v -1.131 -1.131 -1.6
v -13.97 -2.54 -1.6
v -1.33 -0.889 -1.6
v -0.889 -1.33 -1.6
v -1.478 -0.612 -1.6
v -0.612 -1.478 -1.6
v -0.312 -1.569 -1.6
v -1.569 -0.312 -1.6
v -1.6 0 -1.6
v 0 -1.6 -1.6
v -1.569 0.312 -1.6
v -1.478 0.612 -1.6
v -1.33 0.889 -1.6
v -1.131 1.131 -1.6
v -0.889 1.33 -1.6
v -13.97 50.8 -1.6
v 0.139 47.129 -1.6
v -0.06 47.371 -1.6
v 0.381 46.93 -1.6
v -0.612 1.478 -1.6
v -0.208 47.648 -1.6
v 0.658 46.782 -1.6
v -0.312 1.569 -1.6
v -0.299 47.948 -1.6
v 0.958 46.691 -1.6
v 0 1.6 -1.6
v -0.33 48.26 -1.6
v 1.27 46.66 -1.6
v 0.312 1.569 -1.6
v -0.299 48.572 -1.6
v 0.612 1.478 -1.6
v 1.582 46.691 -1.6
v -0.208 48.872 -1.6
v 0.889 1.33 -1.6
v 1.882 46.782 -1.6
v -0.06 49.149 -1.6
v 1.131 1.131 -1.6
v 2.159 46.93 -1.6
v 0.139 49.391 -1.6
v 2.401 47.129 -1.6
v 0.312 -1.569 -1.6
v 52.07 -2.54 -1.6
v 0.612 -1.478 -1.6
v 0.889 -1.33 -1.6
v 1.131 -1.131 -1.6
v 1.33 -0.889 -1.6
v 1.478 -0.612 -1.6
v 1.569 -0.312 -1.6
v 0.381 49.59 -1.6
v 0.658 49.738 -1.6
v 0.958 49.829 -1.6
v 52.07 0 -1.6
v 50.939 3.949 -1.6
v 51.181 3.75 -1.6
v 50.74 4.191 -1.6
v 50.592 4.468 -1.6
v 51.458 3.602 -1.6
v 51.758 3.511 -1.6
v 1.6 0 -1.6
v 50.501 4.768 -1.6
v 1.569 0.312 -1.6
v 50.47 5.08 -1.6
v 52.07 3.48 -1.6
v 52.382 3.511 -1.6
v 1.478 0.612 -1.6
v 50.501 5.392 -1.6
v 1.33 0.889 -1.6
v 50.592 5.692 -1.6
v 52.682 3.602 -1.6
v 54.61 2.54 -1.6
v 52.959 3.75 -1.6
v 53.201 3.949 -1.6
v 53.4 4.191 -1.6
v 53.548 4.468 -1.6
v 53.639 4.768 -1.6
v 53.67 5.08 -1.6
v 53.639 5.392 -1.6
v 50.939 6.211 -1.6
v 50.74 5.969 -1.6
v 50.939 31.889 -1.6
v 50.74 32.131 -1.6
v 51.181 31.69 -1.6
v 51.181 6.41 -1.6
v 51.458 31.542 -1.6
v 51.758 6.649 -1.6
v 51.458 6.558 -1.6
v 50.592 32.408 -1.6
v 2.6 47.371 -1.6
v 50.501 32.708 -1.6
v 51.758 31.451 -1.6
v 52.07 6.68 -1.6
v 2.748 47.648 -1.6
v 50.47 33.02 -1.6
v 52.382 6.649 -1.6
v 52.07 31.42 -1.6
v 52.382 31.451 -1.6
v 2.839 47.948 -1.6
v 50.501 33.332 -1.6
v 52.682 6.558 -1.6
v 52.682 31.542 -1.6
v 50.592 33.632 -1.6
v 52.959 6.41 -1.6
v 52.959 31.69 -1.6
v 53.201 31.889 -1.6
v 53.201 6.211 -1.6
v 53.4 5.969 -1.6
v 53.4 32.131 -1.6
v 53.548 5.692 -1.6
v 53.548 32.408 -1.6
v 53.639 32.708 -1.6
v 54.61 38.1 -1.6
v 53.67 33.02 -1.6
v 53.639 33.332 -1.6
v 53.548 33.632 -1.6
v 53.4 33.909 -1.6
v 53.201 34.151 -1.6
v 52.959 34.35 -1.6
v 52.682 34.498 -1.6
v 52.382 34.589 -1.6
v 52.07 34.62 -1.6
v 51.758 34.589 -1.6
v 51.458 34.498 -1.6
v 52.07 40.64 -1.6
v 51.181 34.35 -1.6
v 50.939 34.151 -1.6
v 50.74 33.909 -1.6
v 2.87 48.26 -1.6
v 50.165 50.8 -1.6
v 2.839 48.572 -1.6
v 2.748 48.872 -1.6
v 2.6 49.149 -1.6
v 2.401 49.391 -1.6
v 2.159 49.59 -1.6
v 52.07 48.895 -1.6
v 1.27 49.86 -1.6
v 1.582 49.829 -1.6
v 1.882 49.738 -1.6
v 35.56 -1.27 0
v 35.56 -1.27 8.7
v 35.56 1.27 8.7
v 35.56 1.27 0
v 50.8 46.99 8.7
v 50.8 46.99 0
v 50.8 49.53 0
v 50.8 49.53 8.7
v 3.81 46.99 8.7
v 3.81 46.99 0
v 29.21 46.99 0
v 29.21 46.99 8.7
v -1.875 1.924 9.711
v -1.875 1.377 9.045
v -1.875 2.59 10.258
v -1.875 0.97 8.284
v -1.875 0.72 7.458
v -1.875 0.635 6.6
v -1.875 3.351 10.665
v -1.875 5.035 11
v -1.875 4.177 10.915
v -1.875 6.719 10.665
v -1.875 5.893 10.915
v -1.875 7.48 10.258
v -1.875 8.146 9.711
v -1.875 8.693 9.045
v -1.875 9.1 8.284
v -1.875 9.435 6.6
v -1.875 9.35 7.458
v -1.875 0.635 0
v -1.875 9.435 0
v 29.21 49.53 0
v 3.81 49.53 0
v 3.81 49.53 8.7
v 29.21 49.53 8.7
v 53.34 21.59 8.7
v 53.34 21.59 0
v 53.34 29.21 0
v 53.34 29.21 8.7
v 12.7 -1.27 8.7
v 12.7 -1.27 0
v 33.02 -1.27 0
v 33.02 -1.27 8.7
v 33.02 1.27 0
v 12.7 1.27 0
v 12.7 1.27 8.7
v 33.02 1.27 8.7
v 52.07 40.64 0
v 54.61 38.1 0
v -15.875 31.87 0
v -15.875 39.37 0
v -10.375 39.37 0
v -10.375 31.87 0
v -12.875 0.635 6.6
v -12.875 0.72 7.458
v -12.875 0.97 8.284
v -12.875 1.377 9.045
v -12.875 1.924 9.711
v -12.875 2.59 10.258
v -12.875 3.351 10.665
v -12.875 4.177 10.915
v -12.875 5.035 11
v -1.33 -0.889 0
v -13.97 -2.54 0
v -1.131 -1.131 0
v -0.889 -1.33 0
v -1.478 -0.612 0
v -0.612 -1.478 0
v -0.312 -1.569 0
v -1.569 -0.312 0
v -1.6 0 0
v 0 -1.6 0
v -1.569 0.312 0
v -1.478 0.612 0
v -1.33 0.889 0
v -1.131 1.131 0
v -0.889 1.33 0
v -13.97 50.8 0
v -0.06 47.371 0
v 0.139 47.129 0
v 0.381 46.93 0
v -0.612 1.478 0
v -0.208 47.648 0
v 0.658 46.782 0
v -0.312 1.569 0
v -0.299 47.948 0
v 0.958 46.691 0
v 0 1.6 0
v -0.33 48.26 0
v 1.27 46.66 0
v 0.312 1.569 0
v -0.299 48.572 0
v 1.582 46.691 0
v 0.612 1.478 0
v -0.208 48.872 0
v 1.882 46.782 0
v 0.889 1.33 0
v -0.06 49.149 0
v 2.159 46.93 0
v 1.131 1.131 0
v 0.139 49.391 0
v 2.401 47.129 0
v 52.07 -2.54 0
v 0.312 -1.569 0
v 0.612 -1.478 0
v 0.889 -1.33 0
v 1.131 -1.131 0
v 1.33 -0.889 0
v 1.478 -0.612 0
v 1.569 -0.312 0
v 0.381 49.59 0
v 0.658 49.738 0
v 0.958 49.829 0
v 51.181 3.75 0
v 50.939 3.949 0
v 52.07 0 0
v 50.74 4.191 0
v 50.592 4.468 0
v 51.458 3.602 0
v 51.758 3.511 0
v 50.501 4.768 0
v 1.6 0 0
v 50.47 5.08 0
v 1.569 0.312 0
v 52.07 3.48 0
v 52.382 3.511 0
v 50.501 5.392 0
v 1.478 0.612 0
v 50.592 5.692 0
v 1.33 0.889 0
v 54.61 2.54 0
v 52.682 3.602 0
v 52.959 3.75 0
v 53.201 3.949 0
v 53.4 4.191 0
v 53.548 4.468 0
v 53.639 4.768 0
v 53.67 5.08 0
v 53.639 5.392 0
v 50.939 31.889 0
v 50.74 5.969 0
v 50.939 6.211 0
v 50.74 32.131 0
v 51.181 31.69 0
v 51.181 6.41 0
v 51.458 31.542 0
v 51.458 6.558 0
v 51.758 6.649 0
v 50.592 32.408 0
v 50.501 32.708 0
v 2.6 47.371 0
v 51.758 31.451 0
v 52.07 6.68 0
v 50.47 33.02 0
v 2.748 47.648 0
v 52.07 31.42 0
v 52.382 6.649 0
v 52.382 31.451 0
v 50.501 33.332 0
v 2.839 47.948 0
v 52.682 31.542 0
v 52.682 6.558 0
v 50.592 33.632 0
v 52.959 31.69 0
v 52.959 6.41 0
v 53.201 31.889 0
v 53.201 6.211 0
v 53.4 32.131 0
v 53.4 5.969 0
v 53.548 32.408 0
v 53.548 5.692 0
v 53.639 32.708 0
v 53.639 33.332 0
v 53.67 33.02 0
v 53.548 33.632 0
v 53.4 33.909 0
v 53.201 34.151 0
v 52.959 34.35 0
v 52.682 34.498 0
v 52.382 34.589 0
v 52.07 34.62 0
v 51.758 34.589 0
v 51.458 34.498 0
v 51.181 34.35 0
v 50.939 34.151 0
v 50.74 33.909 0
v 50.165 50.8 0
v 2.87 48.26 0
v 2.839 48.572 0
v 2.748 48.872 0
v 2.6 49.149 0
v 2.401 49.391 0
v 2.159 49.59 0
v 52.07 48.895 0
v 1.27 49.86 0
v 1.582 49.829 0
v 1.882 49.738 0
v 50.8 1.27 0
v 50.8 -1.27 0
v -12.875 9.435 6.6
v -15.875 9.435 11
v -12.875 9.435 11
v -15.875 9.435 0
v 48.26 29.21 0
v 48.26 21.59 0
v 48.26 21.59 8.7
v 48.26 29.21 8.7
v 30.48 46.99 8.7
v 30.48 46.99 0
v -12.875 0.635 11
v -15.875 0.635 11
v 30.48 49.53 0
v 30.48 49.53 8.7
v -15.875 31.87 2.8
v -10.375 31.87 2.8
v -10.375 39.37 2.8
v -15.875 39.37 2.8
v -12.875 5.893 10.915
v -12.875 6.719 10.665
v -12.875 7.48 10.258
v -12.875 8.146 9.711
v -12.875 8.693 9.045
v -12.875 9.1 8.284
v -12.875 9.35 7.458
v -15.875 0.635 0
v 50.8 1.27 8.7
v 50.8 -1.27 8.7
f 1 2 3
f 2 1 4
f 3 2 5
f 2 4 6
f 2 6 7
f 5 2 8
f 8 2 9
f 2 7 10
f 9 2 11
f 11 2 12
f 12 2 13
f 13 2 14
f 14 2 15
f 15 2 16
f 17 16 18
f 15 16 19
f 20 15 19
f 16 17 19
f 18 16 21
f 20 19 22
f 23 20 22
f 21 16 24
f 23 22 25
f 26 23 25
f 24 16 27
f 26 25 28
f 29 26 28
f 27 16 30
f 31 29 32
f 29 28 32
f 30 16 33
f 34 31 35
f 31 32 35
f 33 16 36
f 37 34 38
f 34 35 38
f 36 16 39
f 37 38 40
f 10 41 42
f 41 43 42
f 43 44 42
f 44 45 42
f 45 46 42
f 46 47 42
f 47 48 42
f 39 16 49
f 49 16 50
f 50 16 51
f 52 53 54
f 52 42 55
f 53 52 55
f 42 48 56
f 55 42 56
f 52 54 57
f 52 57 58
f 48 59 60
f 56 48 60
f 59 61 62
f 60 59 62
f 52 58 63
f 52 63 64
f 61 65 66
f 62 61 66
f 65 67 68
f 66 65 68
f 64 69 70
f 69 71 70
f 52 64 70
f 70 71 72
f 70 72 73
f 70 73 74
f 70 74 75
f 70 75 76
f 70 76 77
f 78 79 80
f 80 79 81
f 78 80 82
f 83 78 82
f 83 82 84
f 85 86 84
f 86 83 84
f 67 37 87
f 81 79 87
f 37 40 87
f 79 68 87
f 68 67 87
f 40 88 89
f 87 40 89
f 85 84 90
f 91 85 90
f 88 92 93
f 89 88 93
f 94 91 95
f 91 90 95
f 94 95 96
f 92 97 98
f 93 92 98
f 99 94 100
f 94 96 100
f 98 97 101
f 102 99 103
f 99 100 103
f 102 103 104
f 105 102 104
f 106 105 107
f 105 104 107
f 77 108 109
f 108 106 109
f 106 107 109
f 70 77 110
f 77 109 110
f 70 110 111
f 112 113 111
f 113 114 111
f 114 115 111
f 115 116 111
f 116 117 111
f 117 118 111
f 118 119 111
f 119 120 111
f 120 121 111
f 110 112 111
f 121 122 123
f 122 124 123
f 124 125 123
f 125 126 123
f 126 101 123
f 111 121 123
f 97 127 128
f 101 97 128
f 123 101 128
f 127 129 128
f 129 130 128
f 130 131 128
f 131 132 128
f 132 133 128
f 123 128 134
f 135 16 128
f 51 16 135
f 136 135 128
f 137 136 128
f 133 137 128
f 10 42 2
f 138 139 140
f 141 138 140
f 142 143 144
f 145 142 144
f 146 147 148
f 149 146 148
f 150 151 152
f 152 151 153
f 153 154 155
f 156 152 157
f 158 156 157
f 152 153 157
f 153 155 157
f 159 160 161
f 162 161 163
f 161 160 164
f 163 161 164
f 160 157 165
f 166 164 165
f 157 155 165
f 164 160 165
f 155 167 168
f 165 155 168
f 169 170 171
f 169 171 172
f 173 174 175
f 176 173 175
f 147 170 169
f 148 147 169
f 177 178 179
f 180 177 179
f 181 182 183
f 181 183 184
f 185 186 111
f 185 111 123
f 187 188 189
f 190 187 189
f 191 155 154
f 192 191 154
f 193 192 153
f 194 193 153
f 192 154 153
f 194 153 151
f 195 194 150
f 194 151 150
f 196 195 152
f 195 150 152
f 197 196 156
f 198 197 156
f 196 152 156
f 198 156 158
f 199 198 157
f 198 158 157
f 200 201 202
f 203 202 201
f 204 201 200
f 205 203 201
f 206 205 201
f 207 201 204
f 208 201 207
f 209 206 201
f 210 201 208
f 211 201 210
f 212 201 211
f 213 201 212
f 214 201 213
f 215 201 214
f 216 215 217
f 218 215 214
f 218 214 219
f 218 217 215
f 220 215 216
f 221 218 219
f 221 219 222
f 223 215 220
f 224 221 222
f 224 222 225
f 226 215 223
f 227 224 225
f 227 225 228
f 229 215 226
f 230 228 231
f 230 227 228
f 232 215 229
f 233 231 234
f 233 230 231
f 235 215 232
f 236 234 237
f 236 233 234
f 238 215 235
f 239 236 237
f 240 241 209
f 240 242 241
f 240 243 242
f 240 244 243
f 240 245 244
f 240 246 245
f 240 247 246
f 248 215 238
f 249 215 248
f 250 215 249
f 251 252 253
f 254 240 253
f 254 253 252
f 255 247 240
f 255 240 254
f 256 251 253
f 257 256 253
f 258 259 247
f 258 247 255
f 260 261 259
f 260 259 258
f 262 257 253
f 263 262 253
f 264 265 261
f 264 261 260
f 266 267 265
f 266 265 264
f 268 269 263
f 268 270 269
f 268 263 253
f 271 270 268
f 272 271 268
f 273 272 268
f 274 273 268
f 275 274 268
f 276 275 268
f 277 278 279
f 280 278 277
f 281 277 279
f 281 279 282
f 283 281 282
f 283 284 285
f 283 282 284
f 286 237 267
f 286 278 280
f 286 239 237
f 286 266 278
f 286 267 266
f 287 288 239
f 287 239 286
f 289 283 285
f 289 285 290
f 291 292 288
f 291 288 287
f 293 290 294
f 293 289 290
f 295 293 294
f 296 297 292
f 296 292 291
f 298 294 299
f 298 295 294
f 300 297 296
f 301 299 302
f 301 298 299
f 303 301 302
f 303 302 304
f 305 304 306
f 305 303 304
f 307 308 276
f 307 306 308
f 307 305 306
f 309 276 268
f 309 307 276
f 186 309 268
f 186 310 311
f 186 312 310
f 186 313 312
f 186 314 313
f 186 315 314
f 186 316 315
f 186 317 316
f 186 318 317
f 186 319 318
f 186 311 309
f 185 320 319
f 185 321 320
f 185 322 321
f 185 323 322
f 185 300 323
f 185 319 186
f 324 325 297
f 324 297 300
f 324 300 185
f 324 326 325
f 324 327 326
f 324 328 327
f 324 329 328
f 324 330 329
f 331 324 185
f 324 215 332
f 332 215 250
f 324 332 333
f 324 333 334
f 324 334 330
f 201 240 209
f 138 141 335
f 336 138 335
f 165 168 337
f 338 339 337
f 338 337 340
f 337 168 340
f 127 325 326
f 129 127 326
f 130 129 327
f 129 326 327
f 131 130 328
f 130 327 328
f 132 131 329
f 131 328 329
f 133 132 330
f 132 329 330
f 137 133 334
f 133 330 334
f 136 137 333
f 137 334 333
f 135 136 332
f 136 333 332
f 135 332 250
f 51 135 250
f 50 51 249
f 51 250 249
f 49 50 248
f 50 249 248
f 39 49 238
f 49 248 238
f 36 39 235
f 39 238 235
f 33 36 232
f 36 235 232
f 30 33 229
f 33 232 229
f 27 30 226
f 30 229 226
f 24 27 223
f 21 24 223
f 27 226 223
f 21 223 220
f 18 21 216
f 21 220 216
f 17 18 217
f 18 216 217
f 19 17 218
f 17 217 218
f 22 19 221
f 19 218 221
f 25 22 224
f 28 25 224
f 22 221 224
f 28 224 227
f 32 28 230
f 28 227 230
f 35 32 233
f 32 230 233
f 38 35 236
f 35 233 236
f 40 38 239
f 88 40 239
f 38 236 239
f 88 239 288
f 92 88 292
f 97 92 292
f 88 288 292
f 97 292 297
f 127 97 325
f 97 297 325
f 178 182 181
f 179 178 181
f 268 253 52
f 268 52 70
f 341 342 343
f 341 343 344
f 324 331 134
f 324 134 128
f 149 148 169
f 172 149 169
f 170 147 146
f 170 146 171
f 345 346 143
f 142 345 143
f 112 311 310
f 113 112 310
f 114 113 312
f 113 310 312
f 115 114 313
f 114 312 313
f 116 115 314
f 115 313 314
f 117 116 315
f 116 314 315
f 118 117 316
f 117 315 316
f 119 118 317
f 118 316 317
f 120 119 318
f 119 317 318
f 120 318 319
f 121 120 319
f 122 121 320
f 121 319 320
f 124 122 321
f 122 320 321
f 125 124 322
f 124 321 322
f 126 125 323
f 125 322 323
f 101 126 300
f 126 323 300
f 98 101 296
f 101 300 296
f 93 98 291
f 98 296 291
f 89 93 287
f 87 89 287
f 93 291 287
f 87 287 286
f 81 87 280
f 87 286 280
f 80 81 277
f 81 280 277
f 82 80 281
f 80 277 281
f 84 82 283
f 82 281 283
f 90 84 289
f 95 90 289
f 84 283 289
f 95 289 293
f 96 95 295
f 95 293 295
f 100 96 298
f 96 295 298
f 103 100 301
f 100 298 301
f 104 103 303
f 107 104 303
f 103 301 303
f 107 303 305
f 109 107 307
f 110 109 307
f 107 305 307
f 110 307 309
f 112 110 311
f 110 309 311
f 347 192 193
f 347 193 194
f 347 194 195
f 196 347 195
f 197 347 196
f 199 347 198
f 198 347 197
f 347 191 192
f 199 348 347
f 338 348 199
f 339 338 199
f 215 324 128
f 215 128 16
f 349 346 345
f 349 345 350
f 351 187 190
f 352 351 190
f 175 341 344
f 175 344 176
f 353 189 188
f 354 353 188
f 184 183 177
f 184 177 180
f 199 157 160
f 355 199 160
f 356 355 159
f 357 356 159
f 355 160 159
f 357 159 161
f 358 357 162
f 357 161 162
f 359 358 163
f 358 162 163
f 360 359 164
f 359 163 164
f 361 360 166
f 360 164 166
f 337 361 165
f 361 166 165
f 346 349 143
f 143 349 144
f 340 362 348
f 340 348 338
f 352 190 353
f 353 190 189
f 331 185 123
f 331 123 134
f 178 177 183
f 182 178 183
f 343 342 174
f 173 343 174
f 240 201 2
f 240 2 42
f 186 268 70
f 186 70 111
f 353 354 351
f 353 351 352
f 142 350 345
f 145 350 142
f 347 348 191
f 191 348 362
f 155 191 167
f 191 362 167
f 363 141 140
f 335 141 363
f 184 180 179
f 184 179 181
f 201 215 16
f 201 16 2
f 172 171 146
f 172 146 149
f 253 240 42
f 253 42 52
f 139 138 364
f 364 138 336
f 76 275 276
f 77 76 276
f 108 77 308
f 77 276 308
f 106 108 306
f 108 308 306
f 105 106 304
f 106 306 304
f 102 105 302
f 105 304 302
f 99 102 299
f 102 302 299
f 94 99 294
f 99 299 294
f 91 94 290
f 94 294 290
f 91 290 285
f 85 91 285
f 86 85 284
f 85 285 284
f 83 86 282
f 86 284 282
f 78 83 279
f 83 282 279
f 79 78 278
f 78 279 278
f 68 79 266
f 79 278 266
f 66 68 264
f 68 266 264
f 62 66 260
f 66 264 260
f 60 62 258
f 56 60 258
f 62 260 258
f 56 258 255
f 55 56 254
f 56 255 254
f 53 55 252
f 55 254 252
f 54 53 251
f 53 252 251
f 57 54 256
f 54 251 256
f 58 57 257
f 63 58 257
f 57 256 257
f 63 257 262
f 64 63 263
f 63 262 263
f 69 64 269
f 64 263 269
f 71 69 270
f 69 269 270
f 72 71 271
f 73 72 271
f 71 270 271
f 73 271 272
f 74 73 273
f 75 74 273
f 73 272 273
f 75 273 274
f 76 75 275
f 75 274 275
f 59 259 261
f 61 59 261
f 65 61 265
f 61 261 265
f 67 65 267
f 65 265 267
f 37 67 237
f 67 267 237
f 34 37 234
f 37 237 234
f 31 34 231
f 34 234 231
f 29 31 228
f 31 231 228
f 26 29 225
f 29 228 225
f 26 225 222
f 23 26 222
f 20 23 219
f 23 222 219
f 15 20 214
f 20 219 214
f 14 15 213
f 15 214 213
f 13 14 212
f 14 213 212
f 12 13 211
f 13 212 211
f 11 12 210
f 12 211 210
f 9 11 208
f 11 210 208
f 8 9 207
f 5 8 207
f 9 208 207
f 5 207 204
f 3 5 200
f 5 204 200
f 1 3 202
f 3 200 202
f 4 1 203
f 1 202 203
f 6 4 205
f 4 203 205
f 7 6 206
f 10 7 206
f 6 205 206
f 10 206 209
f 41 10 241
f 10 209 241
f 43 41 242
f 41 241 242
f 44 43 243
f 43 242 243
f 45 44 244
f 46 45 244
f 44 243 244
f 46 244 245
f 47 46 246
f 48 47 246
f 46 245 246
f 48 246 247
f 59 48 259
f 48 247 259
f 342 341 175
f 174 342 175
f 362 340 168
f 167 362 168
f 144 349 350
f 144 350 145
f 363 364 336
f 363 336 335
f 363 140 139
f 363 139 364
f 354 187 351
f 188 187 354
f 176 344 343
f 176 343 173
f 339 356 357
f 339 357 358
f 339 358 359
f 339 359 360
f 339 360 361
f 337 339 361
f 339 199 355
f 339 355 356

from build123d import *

# Parameters (mm, degrees)
F0_R     = 1.6
F1_DEPTH = 1.6
F2_W     = 25.4
F2_H     = 2.54
F2_W_2   = 20.32
F2_W_3   = 15.24
F2_W_4   = 5.08
F2_H_2   = 7.62
F3_DEPTH = 8.7
F2_W_5   = 1.905
F2_H_3   = 7.5
F2_W_6   = 3.595
F4_DEPTH = 2.8
F2_W_7   = 12.095
F2_H_4   = 8.8
F5_DEPTH = 11
F7_DEPTH = 11


with BuildPart() as f1:
    # F0 (on Top) → F1 (new body)
    with BuildSketch(Plane.XY):
        Polygon((50.165, 50.8), (-13.97, 50.8), (-13.97, -2.54), (52.07, -2.54), (52.07, 0), (54.61, 2.54), (54.61, 38.1), (52.07, 40.64), (52.07, 48.895), align=None)
        Circle(F0_R, mode=Mode.SUBTRACT)
        with Locations((52.07, 5.08)):
            Circle(F0_R, mode=Mode.SUBTRACT)
        with Locations((1.27, 48.26)):
            Circle(F0_R, mode=Mode.SUBTRACT)
        with Locations((52.07, 33.02)):
            Circle(F0_R, mode=Mode.SUBTRACT)
    extrude(amount=-F1_DEPTH)


with BuildPart() as f3:
    # F2 (on face) → F3 (new body)
    with BuildSketch(Plane.XY):
        with Locations((16.51, 48.26)):
            Rectangle(F2_W, F2_H)
        with Locations((40.64, 48.26)):
            Rectangle(F2_W_2, F2_H)
        with Locations((43.18, 0)):
            Rectangle(F2_W_3, F2_H)
        with Locations((22.86, 0)):
            Rectangle(F2_W_2, F2_H)
        with Locations((50.8, 25.4)):
            Rectangle(F2_W_4, F2_H_2)
    extrude(amount=F3_DEPTH)


with BuildPart() as f4:
    # F2 (on face) → F4 (new body)
    with BuildSketch(Plane.XY):
        with Locations((-14.9225, 35.62)):
            Rectangle(F2_W_5, F2_H_3)
        with Locations((-12.1725, 35.62)):
            Rectangle(F2_W_6, F2_H_3)
    extrude(amount=F4_DEPTH)


with BuildPart() as f5:
    # F2 (on face) → F5 (new body)
    with BuildSketch(Plane.XY):
        with Locations((-7.9225, 5.035)):
            Rectangle(F2_W_7, F2_H_4)
        with Locations((-14.9225, 5.035)):
            Rectangle(F2_W_5, F2_H_4)
    extrude(amount=F5_DEPTH)

    # F6 (on face) → F7 (cut)
    with BuildSketch(Plane.YZ.offset(-1.875)):
        with BuildLine():
            ThreePointArc((5.035, 11), (8.14627, 9.71127), (9.435, 6.6))
            Line((9.435, 6.6), (9.435, 11))
            Line((9.435, 11), (5.035, 11))
        make_face()
        with BuildLine():
            ThreePointArc((0.635, 6.6), (1.92373, 9.71127), (5.035, 11))
            Line((5.035, 11), (0.635, 11))
            Line((0.635, 11), (0.635, 6.6))
        make_face()
    extrude(amount=-F7_DEPTH, mode=Mode.SUBTRACT)


solid = Compound([f1.part, f3.part, f4.part, f5.part])
